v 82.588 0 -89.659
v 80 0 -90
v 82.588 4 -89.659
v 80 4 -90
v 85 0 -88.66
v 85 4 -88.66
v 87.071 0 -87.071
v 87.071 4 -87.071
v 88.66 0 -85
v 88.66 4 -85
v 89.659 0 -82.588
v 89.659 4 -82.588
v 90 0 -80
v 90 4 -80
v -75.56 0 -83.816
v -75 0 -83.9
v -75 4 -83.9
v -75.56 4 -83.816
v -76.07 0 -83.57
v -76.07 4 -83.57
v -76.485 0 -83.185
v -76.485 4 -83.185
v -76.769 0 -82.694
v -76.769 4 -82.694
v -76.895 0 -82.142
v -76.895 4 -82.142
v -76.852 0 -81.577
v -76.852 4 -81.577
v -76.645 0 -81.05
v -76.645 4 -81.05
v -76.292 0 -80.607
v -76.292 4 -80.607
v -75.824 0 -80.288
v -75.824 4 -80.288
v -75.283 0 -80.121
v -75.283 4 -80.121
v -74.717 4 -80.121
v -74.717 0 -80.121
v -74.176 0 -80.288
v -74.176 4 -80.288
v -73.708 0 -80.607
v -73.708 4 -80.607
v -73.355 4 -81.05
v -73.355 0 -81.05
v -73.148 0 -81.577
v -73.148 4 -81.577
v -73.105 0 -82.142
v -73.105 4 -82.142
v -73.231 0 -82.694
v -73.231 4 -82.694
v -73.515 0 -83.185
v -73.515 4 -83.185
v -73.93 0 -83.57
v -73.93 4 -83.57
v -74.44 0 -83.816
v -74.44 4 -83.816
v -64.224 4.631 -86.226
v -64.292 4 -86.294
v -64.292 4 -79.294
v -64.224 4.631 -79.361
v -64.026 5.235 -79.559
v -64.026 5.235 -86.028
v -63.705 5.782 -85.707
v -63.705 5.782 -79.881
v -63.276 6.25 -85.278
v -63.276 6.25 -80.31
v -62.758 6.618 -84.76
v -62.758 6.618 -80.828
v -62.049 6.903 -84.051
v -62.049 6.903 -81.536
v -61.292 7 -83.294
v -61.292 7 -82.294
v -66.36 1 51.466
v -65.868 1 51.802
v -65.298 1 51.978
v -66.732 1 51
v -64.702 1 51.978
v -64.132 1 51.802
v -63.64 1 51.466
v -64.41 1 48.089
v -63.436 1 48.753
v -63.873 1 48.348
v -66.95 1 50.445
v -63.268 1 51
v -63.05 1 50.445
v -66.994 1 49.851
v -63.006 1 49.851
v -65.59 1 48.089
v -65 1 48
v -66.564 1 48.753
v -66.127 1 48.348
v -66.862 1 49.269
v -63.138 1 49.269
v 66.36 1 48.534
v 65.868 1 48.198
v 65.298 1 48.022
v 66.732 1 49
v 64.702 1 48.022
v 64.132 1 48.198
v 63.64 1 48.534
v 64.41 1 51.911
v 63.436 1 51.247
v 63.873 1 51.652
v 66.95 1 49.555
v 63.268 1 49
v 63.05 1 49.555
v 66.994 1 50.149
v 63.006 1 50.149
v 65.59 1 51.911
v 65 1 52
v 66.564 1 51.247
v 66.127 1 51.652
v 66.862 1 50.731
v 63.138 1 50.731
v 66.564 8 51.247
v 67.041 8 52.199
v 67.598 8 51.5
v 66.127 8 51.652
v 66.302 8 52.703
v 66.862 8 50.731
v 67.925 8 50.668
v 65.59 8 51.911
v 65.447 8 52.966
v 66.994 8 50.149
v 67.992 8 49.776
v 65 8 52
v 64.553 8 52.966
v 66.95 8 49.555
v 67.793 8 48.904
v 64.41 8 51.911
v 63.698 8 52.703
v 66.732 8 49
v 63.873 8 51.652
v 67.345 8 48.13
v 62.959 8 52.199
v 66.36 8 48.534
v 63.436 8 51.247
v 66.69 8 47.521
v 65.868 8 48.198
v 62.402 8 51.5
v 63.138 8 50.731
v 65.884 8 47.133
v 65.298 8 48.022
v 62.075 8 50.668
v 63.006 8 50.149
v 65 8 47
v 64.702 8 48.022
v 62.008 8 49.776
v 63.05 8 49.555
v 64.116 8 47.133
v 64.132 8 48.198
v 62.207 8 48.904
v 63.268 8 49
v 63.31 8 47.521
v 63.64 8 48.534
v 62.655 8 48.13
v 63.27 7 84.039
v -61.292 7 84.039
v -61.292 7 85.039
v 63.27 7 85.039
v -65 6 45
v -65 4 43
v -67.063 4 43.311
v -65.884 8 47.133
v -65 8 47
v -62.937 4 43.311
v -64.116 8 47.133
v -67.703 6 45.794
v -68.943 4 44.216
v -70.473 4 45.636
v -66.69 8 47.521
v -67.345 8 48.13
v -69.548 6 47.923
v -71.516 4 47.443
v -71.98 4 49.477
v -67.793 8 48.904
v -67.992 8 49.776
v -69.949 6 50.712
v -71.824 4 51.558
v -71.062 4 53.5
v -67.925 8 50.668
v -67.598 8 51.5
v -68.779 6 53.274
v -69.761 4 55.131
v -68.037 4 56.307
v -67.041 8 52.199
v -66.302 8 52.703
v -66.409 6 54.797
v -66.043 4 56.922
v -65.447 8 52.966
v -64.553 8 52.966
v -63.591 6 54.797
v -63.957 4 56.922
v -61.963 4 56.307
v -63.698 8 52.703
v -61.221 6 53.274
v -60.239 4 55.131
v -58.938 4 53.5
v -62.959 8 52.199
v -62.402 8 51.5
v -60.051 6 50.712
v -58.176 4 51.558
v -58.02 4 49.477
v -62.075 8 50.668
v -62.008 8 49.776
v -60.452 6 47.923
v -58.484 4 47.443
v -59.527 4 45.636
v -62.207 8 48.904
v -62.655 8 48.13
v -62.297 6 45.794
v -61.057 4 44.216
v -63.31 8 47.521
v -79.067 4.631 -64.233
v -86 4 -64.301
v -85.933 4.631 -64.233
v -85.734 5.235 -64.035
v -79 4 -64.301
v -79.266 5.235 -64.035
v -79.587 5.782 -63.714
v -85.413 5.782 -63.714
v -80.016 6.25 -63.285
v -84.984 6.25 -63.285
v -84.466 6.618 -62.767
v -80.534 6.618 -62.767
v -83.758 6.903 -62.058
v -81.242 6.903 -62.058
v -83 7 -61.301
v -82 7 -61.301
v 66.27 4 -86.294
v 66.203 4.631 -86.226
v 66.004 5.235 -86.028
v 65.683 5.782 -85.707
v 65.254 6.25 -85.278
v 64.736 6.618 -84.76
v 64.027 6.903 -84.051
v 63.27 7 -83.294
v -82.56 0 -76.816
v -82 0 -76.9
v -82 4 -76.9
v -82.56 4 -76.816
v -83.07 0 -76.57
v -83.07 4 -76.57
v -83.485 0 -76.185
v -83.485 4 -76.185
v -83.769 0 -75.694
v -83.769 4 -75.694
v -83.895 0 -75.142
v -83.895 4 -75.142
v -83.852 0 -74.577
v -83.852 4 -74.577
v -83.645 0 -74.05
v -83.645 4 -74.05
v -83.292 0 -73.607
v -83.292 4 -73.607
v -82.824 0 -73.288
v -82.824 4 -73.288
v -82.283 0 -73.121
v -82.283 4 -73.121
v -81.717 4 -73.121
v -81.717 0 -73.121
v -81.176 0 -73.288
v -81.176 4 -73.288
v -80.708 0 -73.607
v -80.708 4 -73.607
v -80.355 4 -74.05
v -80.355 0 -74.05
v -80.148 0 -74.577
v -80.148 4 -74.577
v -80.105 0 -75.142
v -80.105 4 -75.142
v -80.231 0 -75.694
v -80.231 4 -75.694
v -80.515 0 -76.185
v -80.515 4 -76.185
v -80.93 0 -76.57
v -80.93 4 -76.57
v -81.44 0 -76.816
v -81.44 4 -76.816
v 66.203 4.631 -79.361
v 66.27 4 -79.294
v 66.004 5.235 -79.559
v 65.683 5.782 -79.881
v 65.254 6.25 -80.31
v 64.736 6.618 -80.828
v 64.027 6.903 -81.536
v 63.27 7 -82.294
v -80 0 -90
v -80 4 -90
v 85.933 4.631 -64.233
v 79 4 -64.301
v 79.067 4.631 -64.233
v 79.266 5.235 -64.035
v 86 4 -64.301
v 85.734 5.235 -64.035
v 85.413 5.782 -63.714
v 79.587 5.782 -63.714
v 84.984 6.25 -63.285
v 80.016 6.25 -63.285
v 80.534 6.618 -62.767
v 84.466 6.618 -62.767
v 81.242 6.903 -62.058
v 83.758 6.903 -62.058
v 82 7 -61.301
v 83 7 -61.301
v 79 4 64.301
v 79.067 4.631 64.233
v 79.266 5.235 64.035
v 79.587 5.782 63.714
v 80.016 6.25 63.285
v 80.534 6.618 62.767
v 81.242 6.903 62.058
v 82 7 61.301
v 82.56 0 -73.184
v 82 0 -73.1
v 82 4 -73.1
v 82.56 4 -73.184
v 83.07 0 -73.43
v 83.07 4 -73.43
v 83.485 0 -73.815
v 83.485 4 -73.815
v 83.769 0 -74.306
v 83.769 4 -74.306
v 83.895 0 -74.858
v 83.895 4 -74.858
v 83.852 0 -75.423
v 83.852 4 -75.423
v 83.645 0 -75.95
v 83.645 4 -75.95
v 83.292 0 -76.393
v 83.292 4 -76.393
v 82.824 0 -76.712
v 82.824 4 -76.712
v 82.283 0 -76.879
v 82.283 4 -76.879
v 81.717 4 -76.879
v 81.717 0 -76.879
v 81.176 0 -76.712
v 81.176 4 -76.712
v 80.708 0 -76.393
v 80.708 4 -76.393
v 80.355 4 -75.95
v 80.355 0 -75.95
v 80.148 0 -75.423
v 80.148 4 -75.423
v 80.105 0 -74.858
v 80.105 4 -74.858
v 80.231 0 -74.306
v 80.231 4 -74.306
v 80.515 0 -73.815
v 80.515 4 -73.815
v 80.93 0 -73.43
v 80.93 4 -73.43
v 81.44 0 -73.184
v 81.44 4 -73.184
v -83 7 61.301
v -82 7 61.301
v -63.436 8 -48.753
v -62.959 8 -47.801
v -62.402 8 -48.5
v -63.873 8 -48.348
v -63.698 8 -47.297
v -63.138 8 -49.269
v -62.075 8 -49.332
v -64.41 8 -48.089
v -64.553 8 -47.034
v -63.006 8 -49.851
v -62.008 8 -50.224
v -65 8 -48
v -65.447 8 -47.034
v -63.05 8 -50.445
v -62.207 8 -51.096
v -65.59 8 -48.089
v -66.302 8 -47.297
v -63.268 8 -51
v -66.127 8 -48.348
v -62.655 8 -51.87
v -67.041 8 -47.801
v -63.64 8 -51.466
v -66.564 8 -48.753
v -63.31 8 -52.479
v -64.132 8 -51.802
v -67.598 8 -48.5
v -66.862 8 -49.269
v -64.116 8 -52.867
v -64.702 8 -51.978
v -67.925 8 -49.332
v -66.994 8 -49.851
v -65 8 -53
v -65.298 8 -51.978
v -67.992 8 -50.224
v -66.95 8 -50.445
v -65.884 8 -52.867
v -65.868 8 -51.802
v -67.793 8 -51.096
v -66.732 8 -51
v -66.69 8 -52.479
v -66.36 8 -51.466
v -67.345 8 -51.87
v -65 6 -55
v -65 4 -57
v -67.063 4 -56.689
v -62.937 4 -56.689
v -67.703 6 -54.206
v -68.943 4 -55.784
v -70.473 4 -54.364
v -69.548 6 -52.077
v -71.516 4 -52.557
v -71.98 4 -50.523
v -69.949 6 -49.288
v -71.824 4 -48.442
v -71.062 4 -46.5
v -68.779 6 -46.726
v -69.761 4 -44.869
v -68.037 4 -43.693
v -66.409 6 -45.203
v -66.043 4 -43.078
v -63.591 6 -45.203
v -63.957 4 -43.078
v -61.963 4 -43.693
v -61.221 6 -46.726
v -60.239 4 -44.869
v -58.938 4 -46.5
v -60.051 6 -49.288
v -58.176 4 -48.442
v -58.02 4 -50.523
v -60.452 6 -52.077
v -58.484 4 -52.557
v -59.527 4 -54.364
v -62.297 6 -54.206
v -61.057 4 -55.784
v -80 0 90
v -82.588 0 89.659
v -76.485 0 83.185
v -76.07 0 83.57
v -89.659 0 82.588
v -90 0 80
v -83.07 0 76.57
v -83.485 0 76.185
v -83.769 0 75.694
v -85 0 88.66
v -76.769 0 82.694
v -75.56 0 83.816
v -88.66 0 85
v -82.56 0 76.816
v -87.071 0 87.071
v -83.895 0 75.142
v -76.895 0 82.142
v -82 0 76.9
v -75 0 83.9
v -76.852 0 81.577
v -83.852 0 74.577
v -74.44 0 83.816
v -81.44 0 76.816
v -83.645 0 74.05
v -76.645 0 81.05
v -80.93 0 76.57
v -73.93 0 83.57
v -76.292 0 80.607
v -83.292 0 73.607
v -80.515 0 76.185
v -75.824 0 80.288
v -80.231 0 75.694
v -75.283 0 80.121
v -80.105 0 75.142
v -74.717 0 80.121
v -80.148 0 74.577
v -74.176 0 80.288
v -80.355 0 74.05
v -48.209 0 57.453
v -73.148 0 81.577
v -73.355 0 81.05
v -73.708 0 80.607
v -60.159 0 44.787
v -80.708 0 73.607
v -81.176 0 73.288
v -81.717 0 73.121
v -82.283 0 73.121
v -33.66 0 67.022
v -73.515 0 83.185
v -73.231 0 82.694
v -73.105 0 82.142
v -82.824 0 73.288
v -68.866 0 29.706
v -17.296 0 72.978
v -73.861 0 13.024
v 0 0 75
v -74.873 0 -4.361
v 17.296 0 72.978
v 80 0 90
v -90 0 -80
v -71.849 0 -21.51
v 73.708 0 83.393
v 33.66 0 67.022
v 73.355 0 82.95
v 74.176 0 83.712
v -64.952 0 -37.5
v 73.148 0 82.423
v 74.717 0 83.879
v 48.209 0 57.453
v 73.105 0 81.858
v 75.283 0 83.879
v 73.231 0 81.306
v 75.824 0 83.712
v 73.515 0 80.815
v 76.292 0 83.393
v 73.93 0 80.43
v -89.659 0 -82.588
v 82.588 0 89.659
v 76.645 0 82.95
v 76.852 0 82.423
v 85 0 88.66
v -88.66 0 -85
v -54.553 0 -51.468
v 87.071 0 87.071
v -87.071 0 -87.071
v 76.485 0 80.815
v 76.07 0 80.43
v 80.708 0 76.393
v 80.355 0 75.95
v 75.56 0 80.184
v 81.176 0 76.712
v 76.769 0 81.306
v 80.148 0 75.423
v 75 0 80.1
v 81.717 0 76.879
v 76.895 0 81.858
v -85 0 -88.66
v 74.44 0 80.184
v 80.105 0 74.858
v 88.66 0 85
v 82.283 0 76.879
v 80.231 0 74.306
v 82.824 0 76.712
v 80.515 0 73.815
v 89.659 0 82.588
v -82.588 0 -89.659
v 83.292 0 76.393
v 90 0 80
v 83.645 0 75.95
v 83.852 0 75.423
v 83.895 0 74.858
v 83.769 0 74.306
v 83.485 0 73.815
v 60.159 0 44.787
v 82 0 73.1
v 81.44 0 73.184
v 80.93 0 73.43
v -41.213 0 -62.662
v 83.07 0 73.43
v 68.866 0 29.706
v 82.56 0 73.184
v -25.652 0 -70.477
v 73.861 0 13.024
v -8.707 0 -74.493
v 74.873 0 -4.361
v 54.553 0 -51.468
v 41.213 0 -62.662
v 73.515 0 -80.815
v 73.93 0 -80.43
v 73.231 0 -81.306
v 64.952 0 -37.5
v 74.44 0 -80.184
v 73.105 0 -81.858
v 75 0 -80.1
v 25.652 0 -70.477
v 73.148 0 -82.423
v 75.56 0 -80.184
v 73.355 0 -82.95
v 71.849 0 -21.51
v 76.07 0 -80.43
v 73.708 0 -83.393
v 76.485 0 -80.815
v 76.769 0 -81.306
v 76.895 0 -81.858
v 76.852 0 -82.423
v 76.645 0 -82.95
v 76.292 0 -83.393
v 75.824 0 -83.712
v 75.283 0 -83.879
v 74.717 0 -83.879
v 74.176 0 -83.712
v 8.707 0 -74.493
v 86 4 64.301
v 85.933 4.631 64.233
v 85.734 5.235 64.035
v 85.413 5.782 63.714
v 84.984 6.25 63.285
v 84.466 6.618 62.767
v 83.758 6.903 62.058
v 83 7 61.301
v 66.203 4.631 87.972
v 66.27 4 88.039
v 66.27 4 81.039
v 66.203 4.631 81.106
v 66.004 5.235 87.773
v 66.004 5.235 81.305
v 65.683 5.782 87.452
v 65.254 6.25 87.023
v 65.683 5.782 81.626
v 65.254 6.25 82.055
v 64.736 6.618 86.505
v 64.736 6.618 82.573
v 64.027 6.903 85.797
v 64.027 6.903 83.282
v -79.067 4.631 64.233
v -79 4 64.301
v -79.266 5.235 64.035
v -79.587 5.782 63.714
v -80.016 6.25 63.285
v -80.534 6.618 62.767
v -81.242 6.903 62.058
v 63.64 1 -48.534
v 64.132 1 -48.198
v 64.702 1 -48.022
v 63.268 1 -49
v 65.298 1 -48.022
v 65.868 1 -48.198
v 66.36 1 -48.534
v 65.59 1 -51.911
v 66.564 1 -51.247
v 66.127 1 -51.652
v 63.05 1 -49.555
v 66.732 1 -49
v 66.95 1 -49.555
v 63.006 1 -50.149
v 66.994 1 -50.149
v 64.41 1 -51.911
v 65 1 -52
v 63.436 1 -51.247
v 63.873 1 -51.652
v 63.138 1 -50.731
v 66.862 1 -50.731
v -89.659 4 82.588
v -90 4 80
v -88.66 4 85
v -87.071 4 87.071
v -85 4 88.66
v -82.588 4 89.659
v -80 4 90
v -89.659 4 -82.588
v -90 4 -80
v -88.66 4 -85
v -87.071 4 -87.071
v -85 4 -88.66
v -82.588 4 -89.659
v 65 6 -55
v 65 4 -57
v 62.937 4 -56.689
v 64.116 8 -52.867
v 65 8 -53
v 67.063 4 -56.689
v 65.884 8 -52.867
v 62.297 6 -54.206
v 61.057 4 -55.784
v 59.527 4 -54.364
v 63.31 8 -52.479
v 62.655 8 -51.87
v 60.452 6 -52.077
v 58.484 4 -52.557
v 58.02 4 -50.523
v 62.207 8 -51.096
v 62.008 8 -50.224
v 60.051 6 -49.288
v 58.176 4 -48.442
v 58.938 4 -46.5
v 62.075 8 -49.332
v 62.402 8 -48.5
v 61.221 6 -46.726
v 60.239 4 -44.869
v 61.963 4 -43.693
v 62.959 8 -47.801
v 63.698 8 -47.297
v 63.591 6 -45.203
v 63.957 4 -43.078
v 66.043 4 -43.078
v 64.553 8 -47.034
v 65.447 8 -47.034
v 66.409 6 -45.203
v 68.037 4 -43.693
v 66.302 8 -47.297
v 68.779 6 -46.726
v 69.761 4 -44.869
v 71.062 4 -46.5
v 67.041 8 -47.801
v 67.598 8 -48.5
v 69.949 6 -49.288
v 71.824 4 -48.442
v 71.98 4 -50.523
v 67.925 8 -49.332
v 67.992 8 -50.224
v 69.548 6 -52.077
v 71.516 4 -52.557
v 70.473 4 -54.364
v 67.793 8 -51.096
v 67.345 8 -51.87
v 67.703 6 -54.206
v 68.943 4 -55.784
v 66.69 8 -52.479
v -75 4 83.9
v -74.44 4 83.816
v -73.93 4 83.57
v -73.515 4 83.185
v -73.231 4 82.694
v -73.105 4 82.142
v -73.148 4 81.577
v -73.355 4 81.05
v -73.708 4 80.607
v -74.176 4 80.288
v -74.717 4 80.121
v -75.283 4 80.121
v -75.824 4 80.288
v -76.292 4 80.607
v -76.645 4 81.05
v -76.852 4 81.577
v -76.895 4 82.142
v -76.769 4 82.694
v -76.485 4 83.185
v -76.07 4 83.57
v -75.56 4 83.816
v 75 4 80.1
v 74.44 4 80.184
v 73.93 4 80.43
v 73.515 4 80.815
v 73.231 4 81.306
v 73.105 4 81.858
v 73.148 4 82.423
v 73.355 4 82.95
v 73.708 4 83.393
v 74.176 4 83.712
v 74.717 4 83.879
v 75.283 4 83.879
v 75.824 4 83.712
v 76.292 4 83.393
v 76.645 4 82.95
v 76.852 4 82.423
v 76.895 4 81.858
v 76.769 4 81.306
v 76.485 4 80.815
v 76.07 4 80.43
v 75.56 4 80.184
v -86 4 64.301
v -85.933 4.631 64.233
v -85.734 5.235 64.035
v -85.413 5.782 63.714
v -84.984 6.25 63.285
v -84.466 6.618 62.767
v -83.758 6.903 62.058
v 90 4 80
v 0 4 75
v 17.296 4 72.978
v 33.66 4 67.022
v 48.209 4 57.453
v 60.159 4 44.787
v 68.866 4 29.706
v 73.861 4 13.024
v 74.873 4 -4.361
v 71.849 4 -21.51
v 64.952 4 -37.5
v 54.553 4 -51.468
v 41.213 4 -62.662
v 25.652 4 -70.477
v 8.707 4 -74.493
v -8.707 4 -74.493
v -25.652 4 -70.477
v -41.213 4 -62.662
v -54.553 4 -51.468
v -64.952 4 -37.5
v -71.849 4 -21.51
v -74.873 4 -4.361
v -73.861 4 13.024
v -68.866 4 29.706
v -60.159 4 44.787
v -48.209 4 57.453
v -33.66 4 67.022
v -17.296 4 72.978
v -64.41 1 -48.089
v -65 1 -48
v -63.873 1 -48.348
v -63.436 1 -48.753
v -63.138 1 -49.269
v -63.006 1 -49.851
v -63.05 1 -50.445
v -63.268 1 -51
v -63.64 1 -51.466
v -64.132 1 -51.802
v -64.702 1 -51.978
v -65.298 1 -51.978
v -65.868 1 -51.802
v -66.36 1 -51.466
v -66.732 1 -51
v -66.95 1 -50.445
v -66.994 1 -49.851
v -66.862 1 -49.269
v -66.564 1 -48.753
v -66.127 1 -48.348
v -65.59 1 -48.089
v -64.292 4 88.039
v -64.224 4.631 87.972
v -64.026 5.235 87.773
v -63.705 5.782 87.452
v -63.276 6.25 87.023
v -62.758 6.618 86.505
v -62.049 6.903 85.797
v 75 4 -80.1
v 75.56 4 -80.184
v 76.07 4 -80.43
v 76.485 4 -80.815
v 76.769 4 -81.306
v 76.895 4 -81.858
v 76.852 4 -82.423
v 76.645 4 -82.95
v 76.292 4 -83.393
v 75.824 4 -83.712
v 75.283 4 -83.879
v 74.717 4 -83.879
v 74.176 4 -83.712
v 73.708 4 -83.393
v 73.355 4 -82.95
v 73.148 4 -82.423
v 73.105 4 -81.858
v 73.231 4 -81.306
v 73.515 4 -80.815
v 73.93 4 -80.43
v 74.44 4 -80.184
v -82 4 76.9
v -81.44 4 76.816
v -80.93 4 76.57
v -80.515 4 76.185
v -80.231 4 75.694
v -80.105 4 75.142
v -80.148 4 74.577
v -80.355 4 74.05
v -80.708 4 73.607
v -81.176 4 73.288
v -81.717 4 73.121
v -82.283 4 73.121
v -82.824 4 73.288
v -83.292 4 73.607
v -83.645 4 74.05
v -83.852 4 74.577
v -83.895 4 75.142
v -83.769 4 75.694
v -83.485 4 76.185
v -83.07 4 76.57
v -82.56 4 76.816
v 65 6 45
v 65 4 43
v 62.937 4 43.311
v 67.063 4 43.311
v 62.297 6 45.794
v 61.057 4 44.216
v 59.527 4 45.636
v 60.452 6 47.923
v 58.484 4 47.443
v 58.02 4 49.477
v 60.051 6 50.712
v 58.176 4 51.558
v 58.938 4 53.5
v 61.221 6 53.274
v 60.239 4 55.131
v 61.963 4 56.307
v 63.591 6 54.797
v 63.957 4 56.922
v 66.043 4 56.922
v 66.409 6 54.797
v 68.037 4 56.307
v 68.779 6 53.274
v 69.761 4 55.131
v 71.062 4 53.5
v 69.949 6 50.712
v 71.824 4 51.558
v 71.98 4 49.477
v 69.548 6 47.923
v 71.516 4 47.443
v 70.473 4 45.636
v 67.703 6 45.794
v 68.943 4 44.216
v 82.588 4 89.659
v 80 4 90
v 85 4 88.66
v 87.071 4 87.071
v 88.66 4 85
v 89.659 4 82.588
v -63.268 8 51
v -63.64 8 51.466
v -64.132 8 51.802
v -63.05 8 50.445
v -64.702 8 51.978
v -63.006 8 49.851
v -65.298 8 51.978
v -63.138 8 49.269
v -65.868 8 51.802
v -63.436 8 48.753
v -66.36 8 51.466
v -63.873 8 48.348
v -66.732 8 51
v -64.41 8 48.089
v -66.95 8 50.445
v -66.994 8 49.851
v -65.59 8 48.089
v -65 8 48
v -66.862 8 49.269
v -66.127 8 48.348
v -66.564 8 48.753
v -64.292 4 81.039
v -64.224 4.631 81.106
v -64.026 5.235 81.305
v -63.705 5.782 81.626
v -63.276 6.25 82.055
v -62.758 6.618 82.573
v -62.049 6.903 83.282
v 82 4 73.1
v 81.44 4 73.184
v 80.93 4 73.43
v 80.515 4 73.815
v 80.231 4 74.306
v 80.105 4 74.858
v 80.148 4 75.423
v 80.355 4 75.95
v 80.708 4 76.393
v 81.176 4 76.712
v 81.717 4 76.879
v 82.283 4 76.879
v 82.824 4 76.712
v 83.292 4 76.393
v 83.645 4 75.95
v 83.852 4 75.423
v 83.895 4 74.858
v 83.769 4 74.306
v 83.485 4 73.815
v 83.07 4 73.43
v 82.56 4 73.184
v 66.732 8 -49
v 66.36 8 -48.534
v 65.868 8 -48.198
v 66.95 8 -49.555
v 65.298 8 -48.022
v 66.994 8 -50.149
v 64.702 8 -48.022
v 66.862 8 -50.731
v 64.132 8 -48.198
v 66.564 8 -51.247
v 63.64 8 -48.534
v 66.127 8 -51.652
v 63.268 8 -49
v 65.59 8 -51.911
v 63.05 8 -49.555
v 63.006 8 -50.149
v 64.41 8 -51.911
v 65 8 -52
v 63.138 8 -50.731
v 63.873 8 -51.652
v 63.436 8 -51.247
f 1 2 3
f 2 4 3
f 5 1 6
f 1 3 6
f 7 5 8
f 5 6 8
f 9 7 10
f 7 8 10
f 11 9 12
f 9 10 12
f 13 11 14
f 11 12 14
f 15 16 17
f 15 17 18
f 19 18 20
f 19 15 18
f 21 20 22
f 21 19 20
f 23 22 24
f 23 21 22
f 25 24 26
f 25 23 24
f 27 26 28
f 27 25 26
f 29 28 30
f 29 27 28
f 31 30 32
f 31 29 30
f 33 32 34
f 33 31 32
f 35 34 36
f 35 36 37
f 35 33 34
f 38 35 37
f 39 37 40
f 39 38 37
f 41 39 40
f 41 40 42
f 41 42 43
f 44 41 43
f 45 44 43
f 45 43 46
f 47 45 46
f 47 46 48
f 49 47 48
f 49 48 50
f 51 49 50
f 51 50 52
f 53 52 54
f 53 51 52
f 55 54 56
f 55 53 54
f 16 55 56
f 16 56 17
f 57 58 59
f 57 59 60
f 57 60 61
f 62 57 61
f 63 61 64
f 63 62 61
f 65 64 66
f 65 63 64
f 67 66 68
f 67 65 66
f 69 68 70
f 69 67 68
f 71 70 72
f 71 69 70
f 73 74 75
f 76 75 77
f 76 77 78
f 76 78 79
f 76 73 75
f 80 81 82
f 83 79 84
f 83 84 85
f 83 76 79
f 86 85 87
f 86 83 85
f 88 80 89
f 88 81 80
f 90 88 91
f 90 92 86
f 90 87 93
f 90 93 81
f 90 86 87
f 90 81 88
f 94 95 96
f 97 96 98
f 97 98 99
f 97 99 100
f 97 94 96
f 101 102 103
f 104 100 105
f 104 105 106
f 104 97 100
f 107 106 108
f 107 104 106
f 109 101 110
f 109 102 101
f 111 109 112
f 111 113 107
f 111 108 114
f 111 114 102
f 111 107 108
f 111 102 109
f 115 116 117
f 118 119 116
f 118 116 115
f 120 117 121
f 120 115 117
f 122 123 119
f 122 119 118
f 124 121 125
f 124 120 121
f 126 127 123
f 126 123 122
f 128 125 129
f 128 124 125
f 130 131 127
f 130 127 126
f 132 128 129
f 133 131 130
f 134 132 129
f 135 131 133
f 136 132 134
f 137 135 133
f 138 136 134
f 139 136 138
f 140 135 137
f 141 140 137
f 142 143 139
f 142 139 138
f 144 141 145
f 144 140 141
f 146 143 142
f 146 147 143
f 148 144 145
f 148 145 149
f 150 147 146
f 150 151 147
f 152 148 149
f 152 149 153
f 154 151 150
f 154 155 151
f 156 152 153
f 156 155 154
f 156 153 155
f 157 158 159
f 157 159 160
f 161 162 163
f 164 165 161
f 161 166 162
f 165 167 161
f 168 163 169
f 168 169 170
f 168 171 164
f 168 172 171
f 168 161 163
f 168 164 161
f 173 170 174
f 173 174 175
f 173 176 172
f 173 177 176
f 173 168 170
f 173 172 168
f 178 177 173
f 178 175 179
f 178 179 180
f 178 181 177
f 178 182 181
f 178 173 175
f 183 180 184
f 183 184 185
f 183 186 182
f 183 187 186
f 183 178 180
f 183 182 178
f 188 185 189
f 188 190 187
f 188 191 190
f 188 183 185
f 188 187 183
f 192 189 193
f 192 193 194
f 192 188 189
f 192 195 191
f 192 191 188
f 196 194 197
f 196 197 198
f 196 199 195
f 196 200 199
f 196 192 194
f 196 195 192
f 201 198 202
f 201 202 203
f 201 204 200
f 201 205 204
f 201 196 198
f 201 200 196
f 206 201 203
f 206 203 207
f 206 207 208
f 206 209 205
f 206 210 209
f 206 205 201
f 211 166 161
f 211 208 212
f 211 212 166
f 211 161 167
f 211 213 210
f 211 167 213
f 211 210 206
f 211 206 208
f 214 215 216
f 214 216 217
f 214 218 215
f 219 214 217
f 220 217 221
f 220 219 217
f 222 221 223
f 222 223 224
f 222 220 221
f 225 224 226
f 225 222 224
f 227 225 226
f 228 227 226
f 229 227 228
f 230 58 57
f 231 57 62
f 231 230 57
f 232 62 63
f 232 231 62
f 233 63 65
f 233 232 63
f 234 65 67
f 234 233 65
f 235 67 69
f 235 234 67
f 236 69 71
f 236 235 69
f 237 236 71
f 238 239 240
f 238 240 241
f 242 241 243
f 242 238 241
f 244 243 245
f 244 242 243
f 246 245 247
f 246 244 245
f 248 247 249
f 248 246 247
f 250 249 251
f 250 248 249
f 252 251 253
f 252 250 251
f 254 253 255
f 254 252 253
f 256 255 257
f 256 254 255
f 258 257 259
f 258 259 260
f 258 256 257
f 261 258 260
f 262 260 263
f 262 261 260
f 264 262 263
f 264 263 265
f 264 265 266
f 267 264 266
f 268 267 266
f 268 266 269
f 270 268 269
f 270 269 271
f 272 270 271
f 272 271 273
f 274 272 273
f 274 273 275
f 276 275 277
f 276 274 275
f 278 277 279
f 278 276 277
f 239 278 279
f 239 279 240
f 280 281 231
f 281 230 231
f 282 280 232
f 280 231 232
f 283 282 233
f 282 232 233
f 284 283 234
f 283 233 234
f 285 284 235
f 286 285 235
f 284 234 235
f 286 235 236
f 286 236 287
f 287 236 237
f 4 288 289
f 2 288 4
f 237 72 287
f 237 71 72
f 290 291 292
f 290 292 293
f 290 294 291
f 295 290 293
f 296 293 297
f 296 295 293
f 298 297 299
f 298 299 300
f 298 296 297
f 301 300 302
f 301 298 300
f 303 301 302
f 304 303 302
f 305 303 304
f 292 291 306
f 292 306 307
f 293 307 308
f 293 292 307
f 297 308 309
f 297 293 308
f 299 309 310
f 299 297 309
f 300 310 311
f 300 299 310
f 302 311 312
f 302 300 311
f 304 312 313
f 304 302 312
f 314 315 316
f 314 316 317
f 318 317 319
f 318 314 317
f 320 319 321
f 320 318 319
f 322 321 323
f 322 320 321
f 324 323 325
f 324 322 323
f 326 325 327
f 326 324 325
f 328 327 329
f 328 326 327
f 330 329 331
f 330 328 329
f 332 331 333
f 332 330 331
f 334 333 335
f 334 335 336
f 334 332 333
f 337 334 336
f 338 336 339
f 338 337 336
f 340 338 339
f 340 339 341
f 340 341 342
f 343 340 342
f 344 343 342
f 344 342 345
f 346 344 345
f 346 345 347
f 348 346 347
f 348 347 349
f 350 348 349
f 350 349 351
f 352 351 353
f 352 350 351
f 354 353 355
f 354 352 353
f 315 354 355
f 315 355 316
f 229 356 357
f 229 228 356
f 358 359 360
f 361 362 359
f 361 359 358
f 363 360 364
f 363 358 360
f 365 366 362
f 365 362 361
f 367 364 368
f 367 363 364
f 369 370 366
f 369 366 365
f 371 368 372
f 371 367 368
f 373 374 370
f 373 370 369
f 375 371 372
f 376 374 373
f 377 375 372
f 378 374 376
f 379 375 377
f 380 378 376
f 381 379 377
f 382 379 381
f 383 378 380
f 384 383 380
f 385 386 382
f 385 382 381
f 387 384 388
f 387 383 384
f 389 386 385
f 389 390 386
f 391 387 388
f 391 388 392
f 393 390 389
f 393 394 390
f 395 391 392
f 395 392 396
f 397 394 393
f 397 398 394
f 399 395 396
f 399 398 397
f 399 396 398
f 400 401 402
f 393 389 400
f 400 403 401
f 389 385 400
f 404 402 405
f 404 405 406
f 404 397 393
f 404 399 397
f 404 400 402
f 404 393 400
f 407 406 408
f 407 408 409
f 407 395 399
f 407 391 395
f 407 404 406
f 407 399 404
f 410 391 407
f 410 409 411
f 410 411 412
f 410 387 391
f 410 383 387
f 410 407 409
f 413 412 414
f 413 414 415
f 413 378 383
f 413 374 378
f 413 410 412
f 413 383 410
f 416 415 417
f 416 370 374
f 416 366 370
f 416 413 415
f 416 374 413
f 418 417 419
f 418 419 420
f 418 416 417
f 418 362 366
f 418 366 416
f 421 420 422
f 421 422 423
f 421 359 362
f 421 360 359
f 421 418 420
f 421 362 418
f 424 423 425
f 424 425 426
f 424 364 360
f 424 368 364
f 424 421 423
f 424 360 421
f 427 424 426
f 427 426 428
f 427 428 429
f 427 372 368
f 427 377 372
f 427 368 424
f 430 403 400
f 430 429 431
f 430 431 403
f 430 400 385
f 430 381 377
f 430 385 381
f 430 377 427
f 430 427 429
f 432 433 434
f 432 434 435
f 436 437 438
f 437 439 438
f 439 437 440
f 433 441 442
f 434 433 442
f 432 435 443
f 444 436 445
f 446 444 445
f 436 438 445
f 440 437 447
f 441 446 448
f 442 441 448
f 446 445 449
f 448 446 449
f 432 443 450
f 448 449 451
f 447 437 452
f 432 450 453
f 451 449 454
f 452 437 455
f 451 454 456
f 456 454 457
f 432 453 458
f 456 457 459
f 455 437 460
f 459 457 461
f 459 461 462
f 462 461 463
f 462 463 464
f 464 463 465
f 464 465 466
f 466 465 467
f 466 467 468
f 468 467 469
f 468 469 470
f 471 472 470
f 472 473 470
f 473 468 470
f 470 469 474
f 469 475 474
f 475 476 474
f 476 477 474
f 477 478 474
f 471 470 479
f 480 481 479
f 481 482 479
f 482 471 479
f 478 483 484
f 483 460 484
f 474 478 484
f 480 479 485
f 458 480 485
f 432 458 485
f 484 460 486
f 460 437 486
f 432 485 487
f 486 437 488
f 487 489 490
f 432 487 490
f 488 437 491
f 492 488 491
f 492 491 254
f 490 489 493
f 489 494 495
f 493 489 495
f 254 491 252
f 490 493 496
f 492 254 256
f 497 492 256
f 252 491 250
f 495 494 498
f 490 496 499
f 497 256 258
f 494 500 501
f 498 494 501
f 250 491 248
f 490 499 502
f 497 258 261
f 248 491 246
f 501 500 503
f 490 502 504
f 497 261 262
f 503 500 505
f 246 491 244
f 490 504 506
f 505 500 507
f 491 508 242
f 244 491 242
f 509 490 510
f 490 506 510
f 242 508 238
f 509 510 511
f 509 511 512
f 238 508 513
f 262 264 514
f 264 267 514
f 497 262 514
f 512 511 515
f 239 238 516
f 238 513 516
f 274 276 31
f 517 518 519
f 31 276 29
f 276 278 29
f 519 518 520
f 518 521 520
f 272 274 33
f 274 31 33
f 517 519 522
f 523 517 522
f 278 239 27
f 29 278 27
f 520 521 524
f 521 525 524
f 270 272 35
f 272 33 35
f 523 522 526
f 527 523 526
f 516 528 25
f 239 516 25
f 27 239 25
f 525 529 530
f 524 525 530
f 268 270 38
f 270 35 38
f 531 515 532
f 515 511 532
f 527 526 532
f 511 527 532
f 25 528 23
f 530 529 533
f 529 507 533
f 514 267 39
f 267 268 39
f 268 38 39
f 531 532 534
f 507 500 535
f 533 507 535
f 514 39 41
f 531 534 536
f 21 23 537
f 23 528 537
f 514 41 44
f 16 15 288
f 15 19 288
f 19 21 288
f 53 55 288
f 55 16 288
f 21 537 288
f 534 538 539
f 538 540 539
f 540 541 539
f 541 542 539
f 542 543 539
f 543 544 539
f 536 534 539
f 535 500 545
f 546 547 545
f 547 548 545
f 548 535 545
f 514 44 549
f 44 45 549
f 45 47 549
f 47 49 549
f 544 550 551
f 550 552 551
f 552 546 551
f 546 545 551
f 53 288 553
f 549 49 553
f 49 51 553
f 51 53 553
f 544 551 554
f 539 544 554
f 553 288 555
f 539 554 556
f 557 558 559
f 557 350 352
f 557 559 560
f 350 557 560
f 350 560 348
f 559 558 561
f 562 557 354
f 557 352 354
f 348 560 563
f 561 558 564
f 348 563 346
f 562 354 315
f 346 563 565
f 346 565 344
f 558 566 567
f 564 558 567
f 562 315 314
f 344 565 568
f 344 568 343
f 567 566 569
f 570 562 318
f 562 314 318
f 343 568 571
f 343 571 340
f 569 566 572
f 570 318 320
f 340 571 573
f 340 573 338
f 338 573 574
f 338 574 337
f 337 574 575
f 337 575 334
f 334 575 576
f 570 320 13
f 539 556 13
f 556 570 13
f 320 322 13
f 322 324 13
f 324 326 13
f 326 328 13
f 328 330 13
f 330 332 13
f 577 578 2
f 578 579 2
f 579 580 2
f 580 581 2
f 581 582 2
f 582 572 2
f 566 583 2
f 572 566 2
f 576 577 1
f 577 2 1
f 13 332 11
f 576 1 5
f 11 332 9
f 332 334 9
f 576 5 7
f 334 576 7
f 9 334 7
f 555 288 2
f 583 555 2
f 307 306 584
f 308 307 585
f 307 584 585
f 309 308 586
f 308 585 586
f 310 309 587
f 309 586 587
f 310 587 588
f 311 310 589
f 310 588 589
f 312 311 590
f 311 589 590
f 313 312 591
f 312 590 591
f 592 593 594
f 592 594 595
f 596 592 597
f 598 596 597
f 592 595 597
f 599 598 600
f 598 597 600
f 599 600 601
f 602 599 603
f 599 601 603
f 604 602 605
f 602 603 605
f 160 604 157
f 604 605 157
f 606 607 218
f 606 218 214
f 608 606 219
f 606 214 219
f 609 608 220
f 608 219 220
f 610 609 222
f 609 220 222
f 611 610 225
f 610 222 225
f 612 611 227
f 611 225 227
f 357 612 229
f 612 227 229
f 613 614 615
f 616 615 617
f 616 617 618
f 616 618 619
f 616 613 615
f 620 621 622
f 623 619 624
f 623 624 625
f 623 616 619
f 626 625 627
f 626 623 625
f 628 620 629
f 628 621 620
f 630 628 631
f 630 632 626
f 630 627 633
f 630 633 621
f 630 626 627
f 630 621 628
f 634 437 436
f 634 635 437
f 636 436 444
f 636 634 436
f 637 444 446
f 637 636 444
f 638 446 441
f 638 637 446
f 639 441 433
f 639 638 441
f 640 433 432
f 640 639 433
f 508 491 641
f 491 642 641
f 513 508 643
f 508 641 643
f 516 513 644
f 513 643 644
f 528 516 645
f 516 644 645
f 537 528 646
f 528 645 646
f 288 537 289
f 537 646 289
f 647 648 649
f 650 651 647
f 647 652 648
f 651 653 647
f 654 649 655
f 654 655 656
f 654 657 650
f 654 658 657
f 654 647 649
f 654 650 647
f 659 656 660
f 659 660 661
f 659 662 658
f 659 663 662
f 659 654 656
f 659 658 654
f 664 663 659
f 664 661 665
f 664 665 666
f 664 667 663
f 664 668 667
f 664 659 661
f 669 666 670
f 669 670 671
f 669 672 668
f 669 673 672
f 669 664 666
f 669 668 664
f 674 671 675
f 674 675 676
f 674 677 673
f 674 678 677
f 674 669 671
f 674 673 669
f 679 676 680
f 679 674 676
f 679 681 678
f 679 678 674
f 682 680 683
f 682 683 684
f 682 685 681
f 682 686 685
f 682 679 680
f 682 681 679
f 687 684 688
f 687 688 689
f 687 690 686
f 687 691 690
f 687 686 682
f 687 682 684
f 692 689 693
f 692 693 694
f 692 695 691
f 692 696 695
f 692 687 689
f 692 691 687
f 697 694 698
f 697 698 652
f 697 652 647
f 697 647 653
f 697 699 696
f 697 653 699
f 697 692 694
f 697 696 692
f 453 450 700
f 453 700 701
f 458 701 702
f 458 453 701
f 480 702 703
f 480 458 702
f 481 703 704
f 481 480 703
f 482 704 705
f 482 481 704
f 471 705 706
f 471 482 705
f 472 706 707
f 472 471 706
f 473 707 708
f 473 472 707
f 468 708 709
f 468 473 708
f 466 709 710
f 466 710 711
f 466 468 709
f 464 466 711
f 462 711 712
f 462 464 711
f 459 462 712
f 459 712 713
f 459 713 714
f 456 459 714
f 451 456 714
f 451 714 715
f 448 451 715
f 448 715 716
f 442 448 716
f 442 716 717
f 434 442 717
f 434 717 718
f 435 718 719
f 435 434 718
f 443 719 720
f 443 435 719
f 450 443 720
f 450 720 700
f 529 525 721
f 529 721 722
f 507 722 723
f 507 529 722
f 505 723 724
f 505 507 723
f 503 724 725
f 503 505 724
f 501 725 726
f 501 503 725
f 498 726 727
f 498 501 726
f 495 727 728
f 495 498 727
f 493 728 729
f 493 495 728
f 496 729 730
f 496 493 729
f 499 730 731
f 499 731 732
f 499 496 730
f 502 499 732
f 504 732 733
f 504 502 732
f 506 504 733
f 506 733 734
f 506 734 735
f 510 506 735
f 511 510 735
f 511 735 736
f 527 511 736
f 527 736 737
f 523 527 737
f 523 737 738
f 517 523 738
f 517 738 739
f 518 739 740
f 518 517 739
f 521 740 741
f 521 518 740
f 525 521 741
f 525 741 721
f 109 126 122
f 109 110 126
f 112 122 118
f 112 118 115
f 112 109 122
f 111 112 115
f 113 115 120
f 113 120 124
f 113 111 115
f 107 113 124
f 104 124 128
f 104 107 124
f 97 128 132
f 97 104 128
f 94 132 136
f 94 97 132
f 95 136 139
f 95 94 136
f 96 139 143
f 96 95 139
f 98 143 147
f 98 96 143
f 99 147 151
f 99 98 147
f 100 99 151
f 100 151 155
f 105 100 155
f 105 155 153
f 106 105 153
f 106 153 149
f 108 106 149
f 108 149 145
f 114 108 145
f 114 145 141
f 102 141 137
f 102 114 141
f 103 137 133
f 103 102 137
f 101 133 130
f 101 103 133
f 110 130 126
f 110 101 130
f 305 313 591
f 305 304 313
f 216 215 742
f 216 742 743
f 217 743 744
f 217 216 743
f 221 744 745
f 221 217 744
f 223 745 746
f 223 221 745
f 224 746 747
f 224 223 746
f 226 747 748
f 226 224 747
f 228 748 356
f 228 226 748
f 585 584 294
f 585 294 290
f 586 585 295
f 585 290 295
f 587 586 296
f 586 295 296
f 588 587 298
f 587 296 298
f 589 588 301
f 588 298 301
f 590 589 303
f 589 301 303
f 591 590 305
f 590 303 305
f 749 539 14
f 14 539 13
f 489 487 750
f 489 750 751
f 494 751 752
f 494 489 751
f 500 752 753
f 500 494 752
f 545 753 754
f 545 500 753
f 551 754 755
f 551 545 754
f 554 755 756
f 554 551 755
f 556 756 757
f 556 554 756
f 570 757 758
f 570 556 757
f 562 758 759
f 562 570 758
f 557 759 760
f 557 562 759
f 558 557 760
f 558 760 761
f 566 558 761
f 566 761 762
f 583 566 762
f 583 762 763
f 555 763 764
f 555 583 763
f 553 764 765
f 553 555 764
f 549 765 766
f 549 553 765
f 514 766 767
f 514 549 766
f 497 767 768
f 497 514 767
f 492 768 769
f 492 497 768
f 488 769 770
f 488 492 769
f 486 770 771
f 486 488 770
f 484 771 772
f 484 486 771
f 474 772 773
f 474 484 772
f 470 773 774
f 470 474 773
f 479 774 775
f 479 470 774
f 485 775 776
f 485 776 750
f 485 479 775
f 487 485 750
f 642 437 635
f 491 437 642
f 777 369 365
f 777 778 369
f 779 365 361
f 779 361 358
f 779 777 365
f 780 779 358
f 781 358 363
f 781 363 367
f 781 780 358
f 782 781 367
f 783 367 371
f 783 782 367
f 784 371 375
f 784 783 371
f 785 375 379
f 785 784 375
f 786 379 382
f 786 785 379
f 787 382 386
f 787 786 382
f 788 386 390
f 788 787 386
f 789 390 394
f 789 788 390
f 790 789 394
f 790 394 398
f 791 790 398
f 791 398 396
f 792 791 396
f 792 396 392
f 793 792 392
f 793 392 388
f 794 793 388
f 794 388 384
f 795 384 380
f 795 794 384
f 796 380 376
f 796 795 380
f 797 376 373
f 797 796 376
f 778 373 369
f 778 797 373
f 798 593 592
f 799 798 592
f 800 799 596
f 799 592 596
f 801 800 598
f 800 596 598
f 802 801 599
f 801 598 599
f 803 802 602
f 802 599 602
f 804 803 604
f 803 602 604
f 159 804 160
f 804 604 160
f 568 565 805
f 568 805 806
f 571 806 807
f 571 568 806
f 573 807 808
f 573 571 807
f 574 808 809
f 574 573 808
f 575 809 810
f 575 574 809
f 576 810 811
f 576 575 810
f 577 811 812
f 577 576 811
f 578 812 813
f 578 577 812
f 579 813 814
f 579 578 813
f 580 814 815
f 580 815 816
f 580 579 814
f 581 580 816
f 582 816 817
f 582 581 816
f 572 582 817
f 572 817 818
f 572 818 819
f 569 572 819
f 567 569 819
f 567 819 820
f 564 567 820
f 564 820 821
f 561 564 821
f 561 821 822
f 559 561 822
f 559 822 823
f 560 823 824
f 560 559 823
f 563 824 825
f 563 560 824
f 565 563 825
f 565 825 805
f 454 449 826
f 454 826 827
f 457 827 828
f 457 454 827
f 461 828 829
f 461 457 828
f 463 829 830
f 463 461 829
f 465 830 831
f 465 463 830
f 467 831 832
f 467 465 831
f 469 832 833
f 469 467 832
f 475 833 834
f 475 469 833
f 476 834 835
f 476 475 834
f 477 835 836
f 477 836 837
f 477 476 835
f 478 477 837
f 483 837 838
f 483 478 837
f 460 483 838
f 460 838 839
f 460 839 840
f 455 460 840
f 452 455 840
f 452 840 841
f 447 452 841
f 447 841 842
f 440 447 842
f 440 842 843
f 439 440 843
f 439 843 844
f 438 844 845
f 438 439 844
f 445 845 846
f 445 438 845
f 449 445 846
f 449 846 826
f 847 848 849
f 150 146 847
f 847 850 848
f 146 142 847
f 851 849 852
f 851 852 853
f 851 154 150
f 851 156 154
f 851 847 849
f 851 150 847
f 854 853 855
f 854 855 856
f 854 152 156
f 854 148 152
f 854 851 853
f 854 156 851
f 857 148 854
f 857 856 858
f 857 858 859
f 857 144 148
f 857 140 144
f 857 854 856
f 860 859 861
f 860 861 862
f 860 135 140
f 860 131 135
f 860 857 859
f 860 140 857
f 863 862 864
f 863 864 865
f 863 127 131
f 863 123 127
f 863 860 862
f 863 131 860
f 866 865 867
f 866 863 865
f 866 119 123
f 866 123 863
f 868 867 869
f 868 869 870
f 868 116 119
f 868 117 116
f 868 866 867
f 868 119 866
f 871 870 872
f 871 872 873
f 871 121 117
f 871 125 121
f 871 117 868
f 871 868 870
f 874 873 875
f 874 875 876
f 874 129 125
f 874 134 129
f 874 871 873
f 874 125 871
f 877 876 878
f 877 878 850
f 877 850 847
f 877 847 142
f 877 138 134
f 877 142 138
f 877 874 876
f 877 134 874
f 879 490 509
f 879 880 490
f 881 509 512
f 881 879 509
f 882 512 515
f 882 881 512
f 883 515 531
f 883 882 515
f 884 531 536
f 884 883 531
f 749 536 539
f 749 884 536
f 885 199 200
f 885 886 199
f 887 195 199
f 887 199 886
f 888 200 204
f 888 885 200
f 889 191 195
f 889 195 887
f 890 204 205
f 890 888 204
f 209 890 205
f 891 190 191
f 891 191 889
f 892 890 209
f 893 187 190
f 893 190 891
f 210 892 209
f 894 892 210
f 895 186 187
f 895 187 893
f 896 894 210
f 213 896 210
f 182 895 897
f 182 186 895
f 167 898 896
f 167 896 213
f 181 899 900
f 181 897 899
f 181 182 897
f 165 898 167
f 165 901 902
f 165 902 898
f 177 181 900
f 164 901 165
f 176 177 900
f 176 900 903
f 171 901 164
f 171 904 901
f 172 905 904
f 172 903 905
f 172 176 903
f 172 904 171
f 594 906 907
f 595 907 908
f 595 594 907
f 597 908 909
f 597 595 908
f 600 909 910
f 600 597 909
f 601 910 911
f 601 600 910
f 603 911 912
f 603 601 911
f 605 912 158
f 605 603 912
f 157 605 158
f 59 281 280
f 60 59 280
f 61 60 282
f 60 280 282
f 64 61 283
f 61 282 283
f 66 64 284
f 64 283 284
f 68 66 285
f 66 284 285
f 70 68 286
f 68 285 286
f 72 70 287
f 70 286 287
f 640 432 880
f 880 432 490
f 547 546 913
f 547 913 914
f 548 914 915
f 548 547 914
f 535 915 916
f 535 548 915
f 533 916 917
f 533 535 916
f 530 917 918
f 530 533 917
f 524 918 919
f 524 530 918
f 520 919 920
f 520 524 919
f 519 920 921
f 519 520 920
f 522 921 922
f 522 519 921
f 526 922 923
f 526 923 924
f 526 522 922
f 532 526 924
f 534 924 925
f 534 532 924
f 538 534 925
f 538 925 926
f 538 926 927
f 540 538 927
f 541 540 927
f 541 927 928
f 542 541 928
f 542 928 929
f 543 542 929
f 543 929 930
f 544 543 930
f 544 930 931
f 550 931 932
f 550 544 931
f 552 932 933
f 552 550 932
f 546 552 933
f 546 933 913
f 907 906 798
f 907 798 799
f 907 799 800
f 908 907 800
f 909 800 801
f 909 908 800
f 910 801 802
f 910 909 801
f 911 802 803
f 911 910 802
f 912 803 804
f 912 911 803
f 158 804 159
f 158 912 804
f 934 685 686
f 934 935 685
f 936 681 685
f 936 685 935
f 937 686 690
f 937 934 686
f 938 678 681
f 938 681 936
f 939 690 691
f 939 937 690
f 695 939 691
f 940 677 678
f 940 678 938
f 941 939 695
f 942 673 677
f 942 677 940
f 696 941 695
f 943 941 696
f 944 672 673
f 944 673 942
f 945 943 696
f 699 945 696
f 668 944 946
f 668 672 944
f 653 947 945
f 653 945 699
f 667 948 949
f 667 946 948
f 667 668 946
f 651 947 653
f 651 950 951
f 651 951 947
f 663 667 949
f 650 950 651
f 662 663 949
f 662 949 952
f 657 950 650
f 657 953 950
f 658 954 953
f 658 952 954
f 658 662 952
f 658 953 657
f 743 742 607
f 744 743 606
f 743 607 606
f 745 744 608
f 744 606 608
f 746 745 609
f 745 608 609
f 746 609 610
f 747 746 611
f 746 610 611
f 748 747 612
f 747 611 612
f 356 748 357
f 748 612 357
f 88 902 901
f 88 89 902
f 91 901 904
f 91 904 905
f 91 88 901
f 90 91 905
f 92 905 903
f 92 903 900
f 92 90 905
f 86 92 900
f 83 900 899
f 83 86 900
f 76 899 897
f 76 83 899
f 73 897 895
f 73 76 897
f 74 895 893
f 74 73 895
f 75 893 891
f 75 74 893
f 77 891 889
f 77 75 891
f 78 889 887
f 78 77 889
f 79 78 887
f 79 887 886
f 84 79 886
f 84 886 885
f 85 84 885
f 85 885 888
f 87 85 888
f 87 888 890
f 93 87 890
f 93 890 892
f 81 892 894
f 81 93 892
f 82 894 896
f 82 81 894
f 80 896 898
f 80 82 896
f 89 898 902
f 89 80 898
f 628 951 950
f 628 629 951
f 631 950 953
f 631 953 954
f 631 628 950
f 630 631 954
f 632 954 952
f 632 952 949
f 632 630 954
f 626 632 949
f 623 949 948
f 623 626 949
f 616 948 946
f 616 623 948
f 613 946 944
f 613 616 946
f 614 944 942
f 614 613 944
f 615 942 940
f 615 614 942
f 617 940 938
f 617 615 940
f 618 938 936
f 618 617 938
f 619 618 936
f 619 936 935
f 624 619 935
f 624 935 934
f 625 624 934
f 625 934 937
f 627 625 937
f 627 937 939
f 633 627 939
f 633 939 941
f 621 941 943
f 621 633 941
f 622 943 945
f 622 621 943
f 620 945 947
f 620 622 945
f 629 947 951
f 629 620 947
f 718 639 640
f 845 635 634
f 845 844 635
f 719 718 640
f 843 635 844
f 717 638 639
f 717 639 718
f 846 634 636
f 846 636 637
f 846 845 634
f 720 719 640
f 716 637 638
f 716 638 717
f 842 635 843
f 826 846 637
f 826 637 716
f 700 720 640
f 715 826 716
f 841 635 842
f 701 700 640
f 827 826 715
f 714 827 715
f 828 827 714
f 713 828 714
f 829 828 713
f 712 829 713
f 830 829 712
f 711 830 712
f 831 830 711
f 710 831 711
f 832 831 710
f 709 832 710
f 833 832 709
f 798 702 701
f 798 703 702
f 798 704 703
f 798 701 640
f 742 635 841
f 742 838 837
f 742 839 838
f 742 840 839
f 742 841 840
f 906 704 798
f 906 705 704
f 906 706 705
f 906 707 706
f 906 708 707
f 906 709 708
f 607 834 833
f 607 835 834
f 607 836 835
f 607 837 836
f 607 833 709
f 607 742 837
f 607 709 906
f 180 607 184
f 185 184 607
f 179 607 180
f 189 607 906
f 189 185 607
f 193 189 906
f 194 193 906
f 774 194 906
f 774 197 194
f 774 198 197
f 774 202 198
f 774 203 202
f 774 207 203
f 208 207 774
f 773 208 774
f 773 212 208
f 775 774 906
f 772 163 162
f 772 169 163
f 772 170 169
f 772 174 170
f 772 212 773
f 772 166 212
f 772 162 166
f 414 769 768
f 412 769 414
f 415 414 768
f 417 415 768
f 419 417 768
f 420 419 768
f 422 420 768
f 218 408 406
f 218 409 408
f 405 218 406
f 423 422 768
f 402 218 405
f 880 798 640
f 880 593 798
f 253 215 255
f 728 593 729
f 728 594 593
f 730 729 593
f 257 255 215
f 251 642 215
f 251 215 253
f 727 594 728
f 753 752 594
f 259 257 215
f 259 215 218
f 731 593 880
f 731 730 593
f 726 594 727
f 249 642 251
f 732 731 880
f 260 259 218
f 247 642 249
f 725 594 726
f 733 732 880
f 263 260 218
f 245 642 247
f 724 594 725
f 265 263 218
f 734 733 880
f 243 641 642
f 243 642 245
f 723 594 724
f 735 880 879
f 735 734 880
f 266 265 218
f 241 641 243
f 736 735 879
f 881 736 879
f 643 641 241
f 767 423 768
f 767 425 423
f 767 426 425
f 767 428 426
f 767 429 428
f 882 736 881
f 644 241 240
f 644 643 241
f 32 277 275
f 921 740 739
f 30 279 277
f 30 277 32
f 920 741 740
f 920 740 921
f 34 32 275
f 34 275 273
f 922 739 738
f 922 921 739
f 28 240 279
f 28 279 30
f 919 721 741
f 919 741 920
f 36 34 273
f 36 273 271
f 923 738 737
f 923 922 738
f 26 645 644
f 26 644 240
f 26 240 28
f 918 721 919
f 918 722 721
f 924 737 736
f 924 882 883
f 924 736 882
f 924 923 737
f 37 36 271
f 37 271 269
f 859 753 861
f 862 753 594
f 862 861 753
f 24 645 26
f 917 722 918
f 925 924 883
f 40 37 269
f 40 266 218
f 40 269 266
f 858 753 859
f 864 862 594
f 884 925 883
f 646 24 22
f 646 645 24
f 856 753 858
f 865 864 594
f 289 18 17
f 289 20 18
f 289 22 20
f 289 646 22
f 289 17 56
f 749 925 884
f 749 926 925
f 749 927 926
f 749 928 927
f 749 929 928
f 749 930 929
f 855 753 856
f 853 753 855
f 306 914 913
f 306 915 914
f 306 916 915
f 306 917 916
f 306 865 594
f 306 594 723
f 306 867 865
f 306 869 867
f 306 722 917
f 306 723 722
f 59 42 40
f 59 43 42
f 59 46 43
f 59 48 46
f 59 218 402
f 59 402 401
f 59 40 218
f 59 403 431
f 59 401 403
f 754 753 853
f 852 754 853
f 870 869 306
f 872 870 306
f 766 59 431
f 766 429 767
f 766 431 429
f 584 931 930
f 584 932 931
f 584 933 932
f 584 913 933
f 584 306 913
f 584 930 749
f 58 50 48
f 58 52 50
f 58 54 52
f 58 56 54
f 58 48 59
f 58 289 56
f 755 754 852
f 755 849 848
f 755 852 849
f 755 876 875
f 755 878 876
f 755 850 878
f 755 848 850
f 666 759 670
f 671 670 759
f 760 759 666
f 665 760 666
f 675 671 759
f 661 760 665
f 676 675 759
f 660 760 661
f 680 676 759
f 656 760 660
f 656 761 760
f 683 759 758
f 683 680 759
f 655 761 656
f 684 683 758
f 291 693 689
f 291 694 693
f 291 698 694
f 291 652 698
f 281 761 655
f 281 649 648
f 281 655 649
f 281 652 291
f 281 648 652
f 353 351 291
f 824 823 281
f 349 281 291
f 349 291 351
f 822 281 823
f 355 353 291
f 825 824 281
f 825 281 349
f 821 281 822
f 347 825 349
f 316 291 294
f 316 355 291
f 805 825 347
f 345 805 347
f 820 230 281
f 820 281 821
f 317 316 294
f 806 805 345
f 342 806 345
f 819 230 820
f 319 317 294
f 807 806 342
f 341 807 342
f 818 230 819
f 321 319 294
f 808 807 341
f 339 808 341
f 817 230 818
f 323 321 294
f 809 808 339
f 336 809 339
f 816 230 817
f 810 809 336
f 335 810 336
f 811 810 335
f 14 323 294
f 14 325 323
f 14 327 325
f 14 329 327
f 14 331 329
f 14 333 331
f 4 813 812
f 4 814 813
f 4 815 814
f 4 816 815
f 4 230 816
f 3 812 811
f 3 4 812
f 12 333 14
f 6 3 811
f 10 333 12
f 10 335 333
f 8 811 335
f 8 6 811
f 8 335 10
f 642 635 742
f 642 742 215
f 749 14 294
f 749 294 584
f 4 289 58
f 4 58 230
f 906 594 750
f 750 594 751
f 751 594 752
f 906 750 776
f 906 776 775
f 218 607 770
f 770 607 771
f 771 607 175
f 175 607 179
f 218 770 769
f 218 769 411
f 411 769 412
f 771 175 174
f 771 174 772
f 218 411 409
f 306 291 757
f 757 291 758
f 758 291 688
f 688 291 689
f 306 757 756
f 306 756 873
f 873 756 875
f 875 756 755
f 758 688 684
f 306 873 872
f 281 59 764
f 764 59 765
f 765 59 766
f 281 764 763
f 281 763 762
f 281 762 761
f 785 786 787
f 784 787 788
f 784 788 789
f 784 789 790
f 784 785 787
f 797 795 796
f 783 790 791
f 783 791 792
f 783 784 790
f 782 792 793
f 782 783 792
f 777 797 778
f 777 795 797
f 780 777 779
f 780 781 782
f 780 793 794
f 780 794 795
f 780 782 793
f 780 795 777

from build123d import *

# Parameters (mm, degrees)
SKETCH_1_W          = 180
SKETCH_1_H          = 180
SKETCH_1_R          = 1.9
SKETCH_1_R_2        = 75
EXTRUDE_1_DEPTH     = 4
FILLET_1_R          = 10
SKETCH_2_R          = 3
SKETCH_2_R_2        = 2
EXTRUDE_2_DEPTH     = 4
CHAMFER_1_SIZE      = 4
CUT_EXTRUDE_START   = -7
SKETCH_3_R          = 2
CUT_EXTRUDE_1_DEPTH = 7
SKETCH_4_W          = 7
SKETCH_4_H          = 128.601205204
SKETCH_4_W_2        = 130.561529492
SKETCH_4_H_2        = 7
EXTRUDE_3_DEPTH     = 3
FILLET_2_R          = 3


with BuildPart() as part:
    # Эскиз1 → Бобышка-Вытянуть1 (new body)
    with BuildSketch(Plane(origin=(0, 0, 0), x_dir=(1, 0, 0), z_dir=(0, 1, 0))):
        Rectangle(SKETCH_1_W, SKETCH_1_H)
        with Locations(Location((75, 82, 0), (0, 0, 270))):
            Circle(SKETCH_1_R, mode=Mode.SUBTRACT)
        with Locations(Location((82, 75, 0), (0, 0, 270))):
            Circle(SKETCH_1_R, mode=Mode.SUBTRACT)
        with Locations(Location((-82, 75, 0), (0, 0, 90))):
            Circle(SKETCH_1_R, mode=Mode.SUBTRACT)
        with Locations(Location((-75, 82, 0), (0, 0, 90))):
            Circle(SKETCH_1_R, mode=Mode.SUBTRACT)
        with Locations(Location((-82, -75, 0), (0, 0, 270))):
            Circle(SKETCH_1_R, mode=Mode.SUBTRACT)
        with Locations(Location((-75, -82, 0), (0, 0, 270))):
            Circle(SKETCH_1_R, mode=Mode.SUBTRACT)
        with Locations(Location((75, -82, 0), (0, 0, 90))):
            Circle(SKETCH_1_R, mode=Mode.SUBTRACT)
        with Locations(Location((82, -75, 0), (0, 0, 90))):
            Circle(SKETCH_1_R, mode=Mode.SUBTRACT)
        with Locations(Location((0, 0, 0), (0, 0, 270))):
            Circle(SKETCH_1_R_2, mode=Mode.SUBTRACT)
    extrude(amount=EXTRUDE_1_DEPTH)

    # Скругление1
    fillet_1_edges = [part.edges().sort_by_distance(p)[0] for p in [
        (90, 2, 90),
        (-90, 2, 90),
        (-90, 2, -90),
        (90, 2, -90),
    ]]
    fillet(fillet_1_edges, radius=FILLET_1_R)

    # Эскиз2 → Бобышка-Вытянуть2 (add)
    # profile 1 of 4: a face of its own
    with BuildSketch(Plane(origin=(0, 4, 0), x_dir=(1, 0, 0), z_dir=(0, 1, 0))):
        with Locations(Location((-65, 50, 0), (0, 0, 90))):
            Circle(SKETCH_2_R)
        with Locations(Location((-65, 50, 0), (0, 0, 270))):
            Circle(SKETCH_2_R_2, mode=Mode.SUBTRACT)
    # profile 2 of 4: a face of its own
    with BuildSketch(Plane(origin=(0, 4, 0), x_dir=(1, 0, 0), z_dir=(0, 1, 0))):
        with Locations(Location((65, 50, 0), (0, 0, 90))):
            Circle(SKETCH_2_R)
        with Locations(Location((65, 50, 0), (0, 0, 90))):
            Circle(SKETCH_2_R_2, mode=Mode.SUBTRACT)
    # profile 3 of 4: a face of its own
    with BuildSketch(Plane(origin=(0, 4, 0), x_dir=(1, 0, 0), z_dir=(0, 1, 0))):
        with Locations(Location((65, -50, 0), (0, 0, 90))):
            Circle(SKETCH_2_R)
        with Locations(Location((65, -50, 0), (0, 0, 270))):
            Circle(SKETCH_2_R_2, mode=Mode.SUBTRACT)
    # profile 4 of 4: a face of its own
    with BuildSketch(Plane(origin=(0, 4, 0), x_dir=(1, 0, 0), z_dir=(0, 1, 0))):
        with Locations(Location((-65, -50, 0), (0, 0, 90))):
            Circle(SKETCH_2_R)
        with Locations(Location((-65, -50, 0), (0, 0, 90))):
            Circle(SKETCH_2_R_2, mode=Mode.SUBTRACT)
    extrude(amount=EXTRUDE_2_DEPTH)

    # Фаска1
    chamfer_1_edges = [part.edges().sort_by_distance(p)[0] for p in [
        (-65, 4, -47),
        (65, 4, -47),
        (65, 4, 53),
        (-65, 4, 53),
    ]]
    chamfer(chamfer_1_edges, length=CHAMFER_1_SIZE - 0.0001)  # a hair under: the kernel refuses the full size

    # Эскиз3 → Вырез-Вытянуть1 (cut)
    with BuildSketch(Plane(origin=(0, 8, 0), x_dir=(1, 0, 0), z_dir=(0, 1, 0)).offset(CUT_EXTRUDE_START)):
        with Locations(Location((-65, 50, 0), (0, 0, 270))):
            Circle(SKETCH_3_R)
        with Locations(Location((65, 50, 0), (0, 0, 90))):
            Circle(SKETCH_3_R)
        with Locations(Location((65, -50, 0), (0, 0, 270))):
            Circle(SKETCH_3_R)
        with Locations(Location((-65, -50, 0), (0, 0, 90))):
            Circle(SKETCH_3_R)
    extrude(amount=CUT_EXTRUDE_1_DEPTH, mode=Mode.SUBTRACT)

    # Эскиз4 → Бобышка-Вытянуть3 (add)
    with BuildSketch(Plane(origin=(0, 4, 0), x_dir=(1, 0, 0), z_dir=(0, 1, 0))):
        with Locations((-82.5, 0)):
            Rectangle(SKETCH_4_W, SKETCH_4_H)
        with Locations((82.5, 0)):
            Rectangle(SKETCH_4_W, SKETCH_4_H)
        with Locations((0.989102496, -84.539172171)):
            Rectangle(SKETCH_4_W_2, SKETCH_4_H_2)
        with Locations((0.989102496, 82.793697178)):
            Rectangle(SKETCH_4_W_2, SKETCH_4_H_2)
    extrude(amount=EXTRUDE_3_DEPTH)

    # Скругление2
    fillet_2_edges = [part.edges().sort_by_distance(p)[0] for p in [
        (-82.5, 7, 64.300602602),
        (-86, 7, 0),
        (-82.5, 7, -64.300602602),
        (-79, 7, 0),
        (0.989102496, 7, 81.039172171),
        (66.269867242, 7, 84.539172171),
        (0.989102496, 7, 88.039172171),
        (-64.29166225, 7, 84.539172171),
        (82.5, 7, 64.300602602),
        (79, 7, 0),
        (82.5, 7, -64.300602602),
        (86, 7, 0),
        (0.989102496, 7, -79.293697178),
        (-64.29166225, 7, -82.793697178),
        (0.989102496, 7, -86.293697178),
        (66.269867242, 7, -82.793697178),
    ]]
    fillet(fillet_2_edges, radius=FILLET_2_R - 0.0001)  # a hair under: the kernel refuses the full size


solid = part.part
